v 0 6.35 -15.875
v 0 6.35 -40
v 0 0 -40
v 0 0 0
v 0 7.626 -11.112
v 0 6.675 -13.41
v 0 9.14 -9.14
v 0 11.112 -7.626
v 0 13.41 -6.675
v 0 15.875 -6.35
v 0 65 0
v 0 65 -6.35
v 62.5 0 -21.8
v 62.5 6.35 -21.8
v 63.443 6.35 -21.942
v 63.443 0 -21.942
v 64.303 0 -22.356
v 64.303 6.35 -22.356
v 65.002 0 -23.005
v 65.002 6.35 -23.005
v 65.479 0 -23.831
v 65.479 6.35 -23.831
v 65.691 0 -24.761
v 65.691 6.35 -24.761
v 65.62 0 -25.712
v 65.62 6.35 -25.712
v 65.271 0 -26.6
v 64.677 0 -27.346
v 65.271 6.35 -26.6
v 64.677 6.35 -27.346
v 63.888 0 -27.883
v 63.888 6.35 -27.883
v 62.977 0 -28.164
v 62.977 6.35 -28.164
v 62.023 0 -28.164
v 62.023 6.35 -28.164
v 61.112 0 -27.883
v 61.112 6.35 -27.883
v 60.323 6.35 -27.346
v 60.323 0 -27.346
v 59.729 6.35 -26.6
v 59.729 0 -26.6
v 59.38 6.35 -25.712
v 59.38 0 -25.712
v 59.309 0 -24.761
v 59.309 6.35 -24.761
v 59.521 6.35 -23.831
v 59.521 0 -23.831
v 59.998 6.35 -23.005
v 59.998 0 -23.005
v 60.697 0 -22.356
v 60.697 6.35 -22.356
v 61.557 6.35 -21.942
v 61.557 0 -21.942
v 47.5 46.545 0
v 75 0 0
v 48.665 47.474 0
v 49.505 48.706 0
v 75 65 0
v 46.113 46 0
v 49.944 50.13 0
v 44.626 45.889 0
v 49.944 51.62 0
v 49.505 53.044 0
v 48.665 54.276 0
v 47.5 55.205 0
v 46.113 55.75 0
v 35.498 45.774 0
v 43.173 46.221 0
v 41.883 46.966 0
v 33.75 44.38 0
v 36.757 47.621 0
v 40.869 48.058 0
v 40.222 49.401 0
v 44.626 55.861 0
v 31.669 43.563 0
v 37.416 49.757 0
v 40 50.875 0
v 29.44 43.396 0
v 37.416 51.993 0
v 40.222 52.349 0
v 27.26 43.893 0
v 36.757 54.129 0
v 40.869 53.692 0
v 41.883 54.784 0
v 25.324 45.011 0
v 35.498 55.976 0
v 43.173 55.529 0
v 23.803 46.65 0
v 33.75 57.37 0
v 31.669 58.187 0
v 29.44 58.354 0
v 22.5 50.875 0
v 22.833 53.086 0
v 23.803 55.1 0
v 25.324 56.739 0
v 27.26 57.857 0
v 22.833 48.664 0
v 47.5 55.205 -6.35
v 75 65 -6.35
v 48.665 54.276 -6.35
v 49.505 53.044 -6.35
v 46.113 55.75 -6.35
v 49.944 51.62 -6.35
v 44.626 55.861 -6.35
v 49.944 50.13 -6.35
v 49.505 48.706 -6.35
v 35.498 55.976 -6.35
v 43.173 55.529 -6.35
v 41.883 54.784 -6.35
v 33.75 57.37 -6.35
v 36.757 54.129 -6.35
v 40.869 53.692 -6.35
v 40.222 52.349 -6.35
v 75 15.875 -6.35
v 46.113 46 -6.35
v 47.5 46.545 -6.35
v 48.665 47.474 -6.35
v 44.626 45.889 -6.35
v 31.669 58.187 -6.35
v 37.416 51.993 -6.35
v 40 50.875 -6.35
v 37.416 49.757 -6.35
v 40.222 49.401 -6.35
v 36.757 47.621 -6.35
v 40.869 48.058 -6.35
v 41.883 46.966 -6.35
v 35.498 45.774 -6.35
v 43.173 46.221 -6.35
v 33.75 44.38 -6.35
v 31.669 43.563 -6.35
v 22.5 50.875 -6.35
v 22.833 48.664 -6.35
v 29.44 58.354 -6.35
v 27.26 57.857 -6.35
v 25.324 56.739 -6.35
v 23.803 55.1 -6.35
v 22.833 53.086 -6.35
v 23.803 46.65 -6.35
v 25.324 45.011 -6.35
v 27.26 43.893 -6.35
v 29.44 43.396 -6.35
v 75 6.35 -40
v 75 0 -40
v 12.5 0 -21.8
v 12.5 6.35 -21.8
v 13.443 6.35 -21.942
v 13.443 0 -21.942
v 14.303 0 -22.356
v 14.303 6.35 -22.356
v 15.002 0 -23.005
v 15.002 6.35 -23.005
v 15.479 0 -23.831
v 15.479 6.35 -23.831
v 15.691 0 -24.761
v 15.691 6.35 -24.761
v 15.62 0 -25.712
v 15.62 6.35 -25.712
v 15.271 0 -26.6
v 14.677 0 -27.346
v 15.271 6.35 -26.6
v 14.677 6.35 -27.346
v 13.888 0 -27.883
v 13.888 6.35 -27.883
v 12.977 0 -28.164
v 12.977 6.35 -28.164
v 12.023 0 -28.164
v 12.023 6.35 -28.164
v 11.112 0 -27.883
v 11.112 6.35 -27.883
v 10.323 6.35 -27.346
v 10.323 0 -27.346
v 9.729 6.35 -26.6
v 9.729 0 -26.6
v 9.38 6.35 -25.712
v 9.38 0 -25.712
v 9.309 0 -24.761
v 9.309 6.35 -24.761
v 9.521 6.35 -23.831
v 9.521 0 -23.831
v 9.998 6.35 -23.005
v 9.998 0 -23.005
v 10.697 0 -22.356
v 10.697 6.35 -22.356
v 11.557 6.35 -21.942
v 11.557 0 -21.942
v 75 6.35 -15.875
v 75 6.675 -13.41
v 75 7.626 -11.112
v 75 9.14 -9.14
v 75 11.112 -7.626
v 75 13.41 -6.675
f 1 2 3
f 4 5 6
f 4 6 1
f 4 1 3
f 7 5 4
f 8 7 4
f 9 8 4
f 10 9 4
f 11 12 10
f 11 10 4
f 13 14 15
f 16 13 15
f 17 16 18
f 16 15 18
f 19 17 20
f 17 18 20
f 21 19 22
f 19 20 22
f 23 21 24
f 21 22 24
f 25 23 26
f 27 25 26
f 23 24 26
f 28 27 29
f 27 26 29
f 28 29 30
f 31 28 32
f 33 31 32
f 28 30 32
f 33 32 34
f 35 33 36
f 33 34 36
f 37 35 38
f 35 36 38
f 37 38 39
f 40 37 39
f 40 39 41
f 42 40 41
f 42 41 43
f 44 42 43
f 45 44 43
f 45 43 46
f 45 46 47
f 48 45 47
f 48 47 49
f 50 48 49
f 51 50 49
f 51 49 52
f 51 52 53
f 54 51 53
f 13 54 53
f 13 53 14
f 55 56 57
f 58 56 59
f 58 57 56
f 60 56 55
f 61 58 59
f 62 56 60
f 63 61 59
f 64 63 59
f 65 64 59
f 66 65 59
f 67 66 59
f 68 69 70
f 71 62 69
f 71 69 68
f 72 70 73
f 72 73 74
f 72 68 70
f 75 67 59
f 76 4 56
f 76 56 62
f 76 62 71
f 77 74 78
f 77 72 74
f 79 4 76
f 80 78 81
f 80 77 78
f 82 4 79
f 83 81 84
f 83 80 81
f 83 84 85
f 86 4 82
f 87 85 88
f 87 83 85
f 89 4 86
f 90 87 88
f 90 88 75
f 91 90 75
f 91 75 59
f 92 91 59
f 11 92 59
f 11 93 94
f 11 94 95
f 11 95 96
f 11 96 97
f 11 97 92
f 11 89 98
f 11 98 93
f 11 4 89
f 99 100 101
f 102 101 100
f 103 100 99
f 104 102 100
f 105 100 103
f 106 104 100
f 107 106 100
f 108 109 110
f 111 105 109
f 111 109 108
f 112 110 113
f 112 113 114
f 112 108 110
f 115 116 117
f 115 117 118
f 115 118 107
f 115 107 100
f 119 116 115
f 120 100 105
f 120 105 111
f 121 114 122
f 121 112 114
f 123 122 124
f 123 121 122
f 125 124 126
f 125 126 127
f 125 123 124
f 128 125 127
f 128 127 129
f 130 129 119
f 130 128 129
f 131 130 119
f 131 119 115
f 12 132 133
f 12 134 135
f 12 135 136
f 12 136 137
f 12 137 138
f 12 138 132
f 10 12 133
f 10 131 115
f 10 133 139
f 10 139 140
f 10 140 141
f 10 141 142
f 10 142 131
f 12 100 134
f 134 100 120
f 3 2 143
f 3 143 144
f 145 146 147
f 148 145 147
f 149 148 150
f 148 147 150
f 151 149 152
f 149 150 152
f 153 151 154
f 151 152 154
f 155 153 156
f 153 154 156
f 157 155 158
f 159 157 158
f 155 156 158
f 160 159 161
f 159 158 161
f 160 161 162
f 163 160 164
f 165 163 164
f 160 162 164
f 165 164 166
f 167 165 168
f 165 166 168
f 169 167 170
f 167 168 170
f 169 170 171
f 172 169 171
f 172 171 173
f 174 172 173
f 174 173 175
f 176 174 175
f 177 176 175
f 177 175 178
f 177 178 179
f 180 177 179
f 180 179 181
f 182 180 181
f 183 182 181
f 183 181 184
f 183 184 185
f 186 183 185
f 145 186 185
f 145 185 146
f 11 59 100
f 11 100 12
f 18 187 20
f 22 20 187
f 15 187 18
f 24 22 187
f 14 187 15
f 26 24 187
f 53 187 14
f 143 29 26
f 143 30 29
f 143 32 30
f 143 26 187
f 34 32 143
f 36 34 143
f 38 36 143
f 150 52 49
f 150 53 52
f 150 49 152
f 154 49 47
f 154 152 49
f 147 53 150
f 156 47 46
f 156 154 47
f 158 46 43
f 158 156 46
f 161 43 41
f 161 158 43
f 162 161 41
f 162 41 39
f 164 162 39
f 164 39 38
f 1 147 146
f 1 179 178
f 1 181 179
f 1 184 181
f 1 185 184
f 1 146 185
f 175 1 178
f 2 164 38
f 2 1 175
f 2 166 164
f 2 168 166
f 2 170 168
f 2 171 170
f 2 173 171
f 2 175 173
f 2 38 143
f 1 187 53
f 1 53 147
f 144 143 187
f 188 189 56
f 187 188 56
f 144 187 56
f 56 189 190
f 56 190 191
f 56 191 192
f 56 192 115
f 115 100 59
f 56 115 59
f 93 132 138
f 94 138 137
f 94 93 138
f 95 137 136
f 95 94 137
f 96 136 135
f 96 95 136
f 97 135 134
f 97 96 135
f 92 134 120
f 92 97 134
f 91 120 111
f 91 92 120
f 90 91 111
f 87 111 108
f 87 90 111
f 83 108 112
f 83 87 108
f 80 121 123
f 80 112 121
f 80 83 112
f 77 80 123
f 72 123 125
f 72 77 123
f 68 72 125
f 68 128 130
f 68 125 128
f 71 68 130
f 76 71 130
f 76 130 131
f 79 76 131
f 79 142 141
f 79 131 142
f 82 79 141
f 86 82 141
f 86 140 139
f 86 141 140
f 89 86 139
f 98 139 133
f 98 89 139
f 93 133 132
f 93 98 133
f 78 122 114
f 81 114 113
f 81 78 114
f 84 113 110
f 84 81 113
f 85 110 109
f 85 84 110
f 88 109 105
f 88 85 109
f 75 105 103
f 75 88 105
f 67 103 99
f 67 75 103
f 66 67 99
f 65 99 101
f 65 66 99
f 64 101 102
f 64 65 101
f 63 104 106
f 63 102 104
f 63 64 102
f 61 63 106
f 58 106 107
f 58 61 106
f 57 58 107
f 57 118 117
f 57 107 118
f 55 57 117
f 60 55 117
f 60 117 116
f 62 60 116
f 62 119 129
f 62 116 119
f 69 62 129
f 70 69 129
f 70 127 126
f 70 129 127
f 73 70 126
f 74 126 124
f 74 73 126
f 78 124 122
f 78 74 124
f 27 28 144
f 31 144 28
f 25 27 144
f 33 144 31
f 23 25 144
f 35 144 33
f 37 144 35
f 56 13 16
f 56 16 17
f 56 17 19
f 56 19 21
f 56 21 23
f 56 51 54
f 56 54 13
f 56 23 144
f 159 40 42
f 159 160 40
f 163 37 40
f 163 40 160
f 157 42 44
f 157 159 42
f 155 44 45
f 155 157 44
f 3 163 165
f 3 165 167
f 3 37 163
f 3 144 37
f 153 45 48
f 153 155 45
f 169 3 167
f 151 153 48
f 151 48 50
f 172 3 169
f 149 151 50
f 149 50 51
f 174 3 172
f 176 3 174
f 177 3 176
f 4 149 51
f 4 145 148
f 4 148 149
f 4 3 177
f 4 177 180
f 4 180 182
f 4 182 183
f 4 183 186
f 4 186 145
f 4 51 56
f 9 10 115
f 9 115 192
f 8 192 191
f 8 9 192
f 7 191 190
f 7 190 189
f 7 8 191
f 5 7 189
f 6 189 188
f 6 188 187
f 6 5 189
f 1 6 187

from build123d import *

# Parameters (mm, degrees)
BOSS_EXTRUDE1_DEPTH  = 75
SKETCH2_R            = 7.5
SKETCH2_R_2          = 5
SKETCH2_W            = 75
SKETCH2_H            = 23.9
CUT_EXTRUDE1_DEPTH   = 75
M6_CLEARANCE_HOLE1_D = 6.4


with BuildPart() as part:
    # Sketch1 → Boss-Extrude1 (new body)
    with BuildSketch(Plane(origin=(0, 0, 0), x_dir=(0, 0, -1), z_dir=(1, 0, 0))):
        with BuildLine():
            Line((0, 0), (0, 88.9))
            Line((0, 88.9), (6.35, 88.9))
            Line((6.35, 88.9), (6.35, 15.875))
            ThreePointArc((6.35, 15.875), (9.139807909, 9.139807909), (15.875, 6.35))
            Line((15.875, 6.35), (40, 6.35))
            Line((40, 6.35), (40, 0))
            Line((40, 0), (0, 0))
        make_face()
    extrude(amount=BOSS_EXTRUDE1_DEPTH)

    # Sketch2 → Cut-Extrude1 (cut)
    with BuildSketch(Plane(origin=(0, 0, 0), x_dir=(-1, 0, 0), z_dir=(0, 0, -1))):
        with Locations((-30, 50.875)):
            Circle(SKETCH2_R)
        with Locations((-45, 50.875)):
            Circle(SKETCH2_R_2)
        with Locations((-37.5, 76.95)):
            Rectangle(SKETCH2_W, SKETCH2_H)
    extrude(amount=CUT_EXTRUDE1_DEPTH, mode=Mode.SUBTRACT)

    # M6 Clearance Hole1 (through all)
    with Locations(Plane(origin=(12.5, 0, -25), x_dir=(0, 0, -1), z_dir=(0, -1, 0))):
        with Locations((0, 0), (0, 50)):
            Hole(M6_CLEARANCE_HOLE1_D / 2)


solid = part.part
